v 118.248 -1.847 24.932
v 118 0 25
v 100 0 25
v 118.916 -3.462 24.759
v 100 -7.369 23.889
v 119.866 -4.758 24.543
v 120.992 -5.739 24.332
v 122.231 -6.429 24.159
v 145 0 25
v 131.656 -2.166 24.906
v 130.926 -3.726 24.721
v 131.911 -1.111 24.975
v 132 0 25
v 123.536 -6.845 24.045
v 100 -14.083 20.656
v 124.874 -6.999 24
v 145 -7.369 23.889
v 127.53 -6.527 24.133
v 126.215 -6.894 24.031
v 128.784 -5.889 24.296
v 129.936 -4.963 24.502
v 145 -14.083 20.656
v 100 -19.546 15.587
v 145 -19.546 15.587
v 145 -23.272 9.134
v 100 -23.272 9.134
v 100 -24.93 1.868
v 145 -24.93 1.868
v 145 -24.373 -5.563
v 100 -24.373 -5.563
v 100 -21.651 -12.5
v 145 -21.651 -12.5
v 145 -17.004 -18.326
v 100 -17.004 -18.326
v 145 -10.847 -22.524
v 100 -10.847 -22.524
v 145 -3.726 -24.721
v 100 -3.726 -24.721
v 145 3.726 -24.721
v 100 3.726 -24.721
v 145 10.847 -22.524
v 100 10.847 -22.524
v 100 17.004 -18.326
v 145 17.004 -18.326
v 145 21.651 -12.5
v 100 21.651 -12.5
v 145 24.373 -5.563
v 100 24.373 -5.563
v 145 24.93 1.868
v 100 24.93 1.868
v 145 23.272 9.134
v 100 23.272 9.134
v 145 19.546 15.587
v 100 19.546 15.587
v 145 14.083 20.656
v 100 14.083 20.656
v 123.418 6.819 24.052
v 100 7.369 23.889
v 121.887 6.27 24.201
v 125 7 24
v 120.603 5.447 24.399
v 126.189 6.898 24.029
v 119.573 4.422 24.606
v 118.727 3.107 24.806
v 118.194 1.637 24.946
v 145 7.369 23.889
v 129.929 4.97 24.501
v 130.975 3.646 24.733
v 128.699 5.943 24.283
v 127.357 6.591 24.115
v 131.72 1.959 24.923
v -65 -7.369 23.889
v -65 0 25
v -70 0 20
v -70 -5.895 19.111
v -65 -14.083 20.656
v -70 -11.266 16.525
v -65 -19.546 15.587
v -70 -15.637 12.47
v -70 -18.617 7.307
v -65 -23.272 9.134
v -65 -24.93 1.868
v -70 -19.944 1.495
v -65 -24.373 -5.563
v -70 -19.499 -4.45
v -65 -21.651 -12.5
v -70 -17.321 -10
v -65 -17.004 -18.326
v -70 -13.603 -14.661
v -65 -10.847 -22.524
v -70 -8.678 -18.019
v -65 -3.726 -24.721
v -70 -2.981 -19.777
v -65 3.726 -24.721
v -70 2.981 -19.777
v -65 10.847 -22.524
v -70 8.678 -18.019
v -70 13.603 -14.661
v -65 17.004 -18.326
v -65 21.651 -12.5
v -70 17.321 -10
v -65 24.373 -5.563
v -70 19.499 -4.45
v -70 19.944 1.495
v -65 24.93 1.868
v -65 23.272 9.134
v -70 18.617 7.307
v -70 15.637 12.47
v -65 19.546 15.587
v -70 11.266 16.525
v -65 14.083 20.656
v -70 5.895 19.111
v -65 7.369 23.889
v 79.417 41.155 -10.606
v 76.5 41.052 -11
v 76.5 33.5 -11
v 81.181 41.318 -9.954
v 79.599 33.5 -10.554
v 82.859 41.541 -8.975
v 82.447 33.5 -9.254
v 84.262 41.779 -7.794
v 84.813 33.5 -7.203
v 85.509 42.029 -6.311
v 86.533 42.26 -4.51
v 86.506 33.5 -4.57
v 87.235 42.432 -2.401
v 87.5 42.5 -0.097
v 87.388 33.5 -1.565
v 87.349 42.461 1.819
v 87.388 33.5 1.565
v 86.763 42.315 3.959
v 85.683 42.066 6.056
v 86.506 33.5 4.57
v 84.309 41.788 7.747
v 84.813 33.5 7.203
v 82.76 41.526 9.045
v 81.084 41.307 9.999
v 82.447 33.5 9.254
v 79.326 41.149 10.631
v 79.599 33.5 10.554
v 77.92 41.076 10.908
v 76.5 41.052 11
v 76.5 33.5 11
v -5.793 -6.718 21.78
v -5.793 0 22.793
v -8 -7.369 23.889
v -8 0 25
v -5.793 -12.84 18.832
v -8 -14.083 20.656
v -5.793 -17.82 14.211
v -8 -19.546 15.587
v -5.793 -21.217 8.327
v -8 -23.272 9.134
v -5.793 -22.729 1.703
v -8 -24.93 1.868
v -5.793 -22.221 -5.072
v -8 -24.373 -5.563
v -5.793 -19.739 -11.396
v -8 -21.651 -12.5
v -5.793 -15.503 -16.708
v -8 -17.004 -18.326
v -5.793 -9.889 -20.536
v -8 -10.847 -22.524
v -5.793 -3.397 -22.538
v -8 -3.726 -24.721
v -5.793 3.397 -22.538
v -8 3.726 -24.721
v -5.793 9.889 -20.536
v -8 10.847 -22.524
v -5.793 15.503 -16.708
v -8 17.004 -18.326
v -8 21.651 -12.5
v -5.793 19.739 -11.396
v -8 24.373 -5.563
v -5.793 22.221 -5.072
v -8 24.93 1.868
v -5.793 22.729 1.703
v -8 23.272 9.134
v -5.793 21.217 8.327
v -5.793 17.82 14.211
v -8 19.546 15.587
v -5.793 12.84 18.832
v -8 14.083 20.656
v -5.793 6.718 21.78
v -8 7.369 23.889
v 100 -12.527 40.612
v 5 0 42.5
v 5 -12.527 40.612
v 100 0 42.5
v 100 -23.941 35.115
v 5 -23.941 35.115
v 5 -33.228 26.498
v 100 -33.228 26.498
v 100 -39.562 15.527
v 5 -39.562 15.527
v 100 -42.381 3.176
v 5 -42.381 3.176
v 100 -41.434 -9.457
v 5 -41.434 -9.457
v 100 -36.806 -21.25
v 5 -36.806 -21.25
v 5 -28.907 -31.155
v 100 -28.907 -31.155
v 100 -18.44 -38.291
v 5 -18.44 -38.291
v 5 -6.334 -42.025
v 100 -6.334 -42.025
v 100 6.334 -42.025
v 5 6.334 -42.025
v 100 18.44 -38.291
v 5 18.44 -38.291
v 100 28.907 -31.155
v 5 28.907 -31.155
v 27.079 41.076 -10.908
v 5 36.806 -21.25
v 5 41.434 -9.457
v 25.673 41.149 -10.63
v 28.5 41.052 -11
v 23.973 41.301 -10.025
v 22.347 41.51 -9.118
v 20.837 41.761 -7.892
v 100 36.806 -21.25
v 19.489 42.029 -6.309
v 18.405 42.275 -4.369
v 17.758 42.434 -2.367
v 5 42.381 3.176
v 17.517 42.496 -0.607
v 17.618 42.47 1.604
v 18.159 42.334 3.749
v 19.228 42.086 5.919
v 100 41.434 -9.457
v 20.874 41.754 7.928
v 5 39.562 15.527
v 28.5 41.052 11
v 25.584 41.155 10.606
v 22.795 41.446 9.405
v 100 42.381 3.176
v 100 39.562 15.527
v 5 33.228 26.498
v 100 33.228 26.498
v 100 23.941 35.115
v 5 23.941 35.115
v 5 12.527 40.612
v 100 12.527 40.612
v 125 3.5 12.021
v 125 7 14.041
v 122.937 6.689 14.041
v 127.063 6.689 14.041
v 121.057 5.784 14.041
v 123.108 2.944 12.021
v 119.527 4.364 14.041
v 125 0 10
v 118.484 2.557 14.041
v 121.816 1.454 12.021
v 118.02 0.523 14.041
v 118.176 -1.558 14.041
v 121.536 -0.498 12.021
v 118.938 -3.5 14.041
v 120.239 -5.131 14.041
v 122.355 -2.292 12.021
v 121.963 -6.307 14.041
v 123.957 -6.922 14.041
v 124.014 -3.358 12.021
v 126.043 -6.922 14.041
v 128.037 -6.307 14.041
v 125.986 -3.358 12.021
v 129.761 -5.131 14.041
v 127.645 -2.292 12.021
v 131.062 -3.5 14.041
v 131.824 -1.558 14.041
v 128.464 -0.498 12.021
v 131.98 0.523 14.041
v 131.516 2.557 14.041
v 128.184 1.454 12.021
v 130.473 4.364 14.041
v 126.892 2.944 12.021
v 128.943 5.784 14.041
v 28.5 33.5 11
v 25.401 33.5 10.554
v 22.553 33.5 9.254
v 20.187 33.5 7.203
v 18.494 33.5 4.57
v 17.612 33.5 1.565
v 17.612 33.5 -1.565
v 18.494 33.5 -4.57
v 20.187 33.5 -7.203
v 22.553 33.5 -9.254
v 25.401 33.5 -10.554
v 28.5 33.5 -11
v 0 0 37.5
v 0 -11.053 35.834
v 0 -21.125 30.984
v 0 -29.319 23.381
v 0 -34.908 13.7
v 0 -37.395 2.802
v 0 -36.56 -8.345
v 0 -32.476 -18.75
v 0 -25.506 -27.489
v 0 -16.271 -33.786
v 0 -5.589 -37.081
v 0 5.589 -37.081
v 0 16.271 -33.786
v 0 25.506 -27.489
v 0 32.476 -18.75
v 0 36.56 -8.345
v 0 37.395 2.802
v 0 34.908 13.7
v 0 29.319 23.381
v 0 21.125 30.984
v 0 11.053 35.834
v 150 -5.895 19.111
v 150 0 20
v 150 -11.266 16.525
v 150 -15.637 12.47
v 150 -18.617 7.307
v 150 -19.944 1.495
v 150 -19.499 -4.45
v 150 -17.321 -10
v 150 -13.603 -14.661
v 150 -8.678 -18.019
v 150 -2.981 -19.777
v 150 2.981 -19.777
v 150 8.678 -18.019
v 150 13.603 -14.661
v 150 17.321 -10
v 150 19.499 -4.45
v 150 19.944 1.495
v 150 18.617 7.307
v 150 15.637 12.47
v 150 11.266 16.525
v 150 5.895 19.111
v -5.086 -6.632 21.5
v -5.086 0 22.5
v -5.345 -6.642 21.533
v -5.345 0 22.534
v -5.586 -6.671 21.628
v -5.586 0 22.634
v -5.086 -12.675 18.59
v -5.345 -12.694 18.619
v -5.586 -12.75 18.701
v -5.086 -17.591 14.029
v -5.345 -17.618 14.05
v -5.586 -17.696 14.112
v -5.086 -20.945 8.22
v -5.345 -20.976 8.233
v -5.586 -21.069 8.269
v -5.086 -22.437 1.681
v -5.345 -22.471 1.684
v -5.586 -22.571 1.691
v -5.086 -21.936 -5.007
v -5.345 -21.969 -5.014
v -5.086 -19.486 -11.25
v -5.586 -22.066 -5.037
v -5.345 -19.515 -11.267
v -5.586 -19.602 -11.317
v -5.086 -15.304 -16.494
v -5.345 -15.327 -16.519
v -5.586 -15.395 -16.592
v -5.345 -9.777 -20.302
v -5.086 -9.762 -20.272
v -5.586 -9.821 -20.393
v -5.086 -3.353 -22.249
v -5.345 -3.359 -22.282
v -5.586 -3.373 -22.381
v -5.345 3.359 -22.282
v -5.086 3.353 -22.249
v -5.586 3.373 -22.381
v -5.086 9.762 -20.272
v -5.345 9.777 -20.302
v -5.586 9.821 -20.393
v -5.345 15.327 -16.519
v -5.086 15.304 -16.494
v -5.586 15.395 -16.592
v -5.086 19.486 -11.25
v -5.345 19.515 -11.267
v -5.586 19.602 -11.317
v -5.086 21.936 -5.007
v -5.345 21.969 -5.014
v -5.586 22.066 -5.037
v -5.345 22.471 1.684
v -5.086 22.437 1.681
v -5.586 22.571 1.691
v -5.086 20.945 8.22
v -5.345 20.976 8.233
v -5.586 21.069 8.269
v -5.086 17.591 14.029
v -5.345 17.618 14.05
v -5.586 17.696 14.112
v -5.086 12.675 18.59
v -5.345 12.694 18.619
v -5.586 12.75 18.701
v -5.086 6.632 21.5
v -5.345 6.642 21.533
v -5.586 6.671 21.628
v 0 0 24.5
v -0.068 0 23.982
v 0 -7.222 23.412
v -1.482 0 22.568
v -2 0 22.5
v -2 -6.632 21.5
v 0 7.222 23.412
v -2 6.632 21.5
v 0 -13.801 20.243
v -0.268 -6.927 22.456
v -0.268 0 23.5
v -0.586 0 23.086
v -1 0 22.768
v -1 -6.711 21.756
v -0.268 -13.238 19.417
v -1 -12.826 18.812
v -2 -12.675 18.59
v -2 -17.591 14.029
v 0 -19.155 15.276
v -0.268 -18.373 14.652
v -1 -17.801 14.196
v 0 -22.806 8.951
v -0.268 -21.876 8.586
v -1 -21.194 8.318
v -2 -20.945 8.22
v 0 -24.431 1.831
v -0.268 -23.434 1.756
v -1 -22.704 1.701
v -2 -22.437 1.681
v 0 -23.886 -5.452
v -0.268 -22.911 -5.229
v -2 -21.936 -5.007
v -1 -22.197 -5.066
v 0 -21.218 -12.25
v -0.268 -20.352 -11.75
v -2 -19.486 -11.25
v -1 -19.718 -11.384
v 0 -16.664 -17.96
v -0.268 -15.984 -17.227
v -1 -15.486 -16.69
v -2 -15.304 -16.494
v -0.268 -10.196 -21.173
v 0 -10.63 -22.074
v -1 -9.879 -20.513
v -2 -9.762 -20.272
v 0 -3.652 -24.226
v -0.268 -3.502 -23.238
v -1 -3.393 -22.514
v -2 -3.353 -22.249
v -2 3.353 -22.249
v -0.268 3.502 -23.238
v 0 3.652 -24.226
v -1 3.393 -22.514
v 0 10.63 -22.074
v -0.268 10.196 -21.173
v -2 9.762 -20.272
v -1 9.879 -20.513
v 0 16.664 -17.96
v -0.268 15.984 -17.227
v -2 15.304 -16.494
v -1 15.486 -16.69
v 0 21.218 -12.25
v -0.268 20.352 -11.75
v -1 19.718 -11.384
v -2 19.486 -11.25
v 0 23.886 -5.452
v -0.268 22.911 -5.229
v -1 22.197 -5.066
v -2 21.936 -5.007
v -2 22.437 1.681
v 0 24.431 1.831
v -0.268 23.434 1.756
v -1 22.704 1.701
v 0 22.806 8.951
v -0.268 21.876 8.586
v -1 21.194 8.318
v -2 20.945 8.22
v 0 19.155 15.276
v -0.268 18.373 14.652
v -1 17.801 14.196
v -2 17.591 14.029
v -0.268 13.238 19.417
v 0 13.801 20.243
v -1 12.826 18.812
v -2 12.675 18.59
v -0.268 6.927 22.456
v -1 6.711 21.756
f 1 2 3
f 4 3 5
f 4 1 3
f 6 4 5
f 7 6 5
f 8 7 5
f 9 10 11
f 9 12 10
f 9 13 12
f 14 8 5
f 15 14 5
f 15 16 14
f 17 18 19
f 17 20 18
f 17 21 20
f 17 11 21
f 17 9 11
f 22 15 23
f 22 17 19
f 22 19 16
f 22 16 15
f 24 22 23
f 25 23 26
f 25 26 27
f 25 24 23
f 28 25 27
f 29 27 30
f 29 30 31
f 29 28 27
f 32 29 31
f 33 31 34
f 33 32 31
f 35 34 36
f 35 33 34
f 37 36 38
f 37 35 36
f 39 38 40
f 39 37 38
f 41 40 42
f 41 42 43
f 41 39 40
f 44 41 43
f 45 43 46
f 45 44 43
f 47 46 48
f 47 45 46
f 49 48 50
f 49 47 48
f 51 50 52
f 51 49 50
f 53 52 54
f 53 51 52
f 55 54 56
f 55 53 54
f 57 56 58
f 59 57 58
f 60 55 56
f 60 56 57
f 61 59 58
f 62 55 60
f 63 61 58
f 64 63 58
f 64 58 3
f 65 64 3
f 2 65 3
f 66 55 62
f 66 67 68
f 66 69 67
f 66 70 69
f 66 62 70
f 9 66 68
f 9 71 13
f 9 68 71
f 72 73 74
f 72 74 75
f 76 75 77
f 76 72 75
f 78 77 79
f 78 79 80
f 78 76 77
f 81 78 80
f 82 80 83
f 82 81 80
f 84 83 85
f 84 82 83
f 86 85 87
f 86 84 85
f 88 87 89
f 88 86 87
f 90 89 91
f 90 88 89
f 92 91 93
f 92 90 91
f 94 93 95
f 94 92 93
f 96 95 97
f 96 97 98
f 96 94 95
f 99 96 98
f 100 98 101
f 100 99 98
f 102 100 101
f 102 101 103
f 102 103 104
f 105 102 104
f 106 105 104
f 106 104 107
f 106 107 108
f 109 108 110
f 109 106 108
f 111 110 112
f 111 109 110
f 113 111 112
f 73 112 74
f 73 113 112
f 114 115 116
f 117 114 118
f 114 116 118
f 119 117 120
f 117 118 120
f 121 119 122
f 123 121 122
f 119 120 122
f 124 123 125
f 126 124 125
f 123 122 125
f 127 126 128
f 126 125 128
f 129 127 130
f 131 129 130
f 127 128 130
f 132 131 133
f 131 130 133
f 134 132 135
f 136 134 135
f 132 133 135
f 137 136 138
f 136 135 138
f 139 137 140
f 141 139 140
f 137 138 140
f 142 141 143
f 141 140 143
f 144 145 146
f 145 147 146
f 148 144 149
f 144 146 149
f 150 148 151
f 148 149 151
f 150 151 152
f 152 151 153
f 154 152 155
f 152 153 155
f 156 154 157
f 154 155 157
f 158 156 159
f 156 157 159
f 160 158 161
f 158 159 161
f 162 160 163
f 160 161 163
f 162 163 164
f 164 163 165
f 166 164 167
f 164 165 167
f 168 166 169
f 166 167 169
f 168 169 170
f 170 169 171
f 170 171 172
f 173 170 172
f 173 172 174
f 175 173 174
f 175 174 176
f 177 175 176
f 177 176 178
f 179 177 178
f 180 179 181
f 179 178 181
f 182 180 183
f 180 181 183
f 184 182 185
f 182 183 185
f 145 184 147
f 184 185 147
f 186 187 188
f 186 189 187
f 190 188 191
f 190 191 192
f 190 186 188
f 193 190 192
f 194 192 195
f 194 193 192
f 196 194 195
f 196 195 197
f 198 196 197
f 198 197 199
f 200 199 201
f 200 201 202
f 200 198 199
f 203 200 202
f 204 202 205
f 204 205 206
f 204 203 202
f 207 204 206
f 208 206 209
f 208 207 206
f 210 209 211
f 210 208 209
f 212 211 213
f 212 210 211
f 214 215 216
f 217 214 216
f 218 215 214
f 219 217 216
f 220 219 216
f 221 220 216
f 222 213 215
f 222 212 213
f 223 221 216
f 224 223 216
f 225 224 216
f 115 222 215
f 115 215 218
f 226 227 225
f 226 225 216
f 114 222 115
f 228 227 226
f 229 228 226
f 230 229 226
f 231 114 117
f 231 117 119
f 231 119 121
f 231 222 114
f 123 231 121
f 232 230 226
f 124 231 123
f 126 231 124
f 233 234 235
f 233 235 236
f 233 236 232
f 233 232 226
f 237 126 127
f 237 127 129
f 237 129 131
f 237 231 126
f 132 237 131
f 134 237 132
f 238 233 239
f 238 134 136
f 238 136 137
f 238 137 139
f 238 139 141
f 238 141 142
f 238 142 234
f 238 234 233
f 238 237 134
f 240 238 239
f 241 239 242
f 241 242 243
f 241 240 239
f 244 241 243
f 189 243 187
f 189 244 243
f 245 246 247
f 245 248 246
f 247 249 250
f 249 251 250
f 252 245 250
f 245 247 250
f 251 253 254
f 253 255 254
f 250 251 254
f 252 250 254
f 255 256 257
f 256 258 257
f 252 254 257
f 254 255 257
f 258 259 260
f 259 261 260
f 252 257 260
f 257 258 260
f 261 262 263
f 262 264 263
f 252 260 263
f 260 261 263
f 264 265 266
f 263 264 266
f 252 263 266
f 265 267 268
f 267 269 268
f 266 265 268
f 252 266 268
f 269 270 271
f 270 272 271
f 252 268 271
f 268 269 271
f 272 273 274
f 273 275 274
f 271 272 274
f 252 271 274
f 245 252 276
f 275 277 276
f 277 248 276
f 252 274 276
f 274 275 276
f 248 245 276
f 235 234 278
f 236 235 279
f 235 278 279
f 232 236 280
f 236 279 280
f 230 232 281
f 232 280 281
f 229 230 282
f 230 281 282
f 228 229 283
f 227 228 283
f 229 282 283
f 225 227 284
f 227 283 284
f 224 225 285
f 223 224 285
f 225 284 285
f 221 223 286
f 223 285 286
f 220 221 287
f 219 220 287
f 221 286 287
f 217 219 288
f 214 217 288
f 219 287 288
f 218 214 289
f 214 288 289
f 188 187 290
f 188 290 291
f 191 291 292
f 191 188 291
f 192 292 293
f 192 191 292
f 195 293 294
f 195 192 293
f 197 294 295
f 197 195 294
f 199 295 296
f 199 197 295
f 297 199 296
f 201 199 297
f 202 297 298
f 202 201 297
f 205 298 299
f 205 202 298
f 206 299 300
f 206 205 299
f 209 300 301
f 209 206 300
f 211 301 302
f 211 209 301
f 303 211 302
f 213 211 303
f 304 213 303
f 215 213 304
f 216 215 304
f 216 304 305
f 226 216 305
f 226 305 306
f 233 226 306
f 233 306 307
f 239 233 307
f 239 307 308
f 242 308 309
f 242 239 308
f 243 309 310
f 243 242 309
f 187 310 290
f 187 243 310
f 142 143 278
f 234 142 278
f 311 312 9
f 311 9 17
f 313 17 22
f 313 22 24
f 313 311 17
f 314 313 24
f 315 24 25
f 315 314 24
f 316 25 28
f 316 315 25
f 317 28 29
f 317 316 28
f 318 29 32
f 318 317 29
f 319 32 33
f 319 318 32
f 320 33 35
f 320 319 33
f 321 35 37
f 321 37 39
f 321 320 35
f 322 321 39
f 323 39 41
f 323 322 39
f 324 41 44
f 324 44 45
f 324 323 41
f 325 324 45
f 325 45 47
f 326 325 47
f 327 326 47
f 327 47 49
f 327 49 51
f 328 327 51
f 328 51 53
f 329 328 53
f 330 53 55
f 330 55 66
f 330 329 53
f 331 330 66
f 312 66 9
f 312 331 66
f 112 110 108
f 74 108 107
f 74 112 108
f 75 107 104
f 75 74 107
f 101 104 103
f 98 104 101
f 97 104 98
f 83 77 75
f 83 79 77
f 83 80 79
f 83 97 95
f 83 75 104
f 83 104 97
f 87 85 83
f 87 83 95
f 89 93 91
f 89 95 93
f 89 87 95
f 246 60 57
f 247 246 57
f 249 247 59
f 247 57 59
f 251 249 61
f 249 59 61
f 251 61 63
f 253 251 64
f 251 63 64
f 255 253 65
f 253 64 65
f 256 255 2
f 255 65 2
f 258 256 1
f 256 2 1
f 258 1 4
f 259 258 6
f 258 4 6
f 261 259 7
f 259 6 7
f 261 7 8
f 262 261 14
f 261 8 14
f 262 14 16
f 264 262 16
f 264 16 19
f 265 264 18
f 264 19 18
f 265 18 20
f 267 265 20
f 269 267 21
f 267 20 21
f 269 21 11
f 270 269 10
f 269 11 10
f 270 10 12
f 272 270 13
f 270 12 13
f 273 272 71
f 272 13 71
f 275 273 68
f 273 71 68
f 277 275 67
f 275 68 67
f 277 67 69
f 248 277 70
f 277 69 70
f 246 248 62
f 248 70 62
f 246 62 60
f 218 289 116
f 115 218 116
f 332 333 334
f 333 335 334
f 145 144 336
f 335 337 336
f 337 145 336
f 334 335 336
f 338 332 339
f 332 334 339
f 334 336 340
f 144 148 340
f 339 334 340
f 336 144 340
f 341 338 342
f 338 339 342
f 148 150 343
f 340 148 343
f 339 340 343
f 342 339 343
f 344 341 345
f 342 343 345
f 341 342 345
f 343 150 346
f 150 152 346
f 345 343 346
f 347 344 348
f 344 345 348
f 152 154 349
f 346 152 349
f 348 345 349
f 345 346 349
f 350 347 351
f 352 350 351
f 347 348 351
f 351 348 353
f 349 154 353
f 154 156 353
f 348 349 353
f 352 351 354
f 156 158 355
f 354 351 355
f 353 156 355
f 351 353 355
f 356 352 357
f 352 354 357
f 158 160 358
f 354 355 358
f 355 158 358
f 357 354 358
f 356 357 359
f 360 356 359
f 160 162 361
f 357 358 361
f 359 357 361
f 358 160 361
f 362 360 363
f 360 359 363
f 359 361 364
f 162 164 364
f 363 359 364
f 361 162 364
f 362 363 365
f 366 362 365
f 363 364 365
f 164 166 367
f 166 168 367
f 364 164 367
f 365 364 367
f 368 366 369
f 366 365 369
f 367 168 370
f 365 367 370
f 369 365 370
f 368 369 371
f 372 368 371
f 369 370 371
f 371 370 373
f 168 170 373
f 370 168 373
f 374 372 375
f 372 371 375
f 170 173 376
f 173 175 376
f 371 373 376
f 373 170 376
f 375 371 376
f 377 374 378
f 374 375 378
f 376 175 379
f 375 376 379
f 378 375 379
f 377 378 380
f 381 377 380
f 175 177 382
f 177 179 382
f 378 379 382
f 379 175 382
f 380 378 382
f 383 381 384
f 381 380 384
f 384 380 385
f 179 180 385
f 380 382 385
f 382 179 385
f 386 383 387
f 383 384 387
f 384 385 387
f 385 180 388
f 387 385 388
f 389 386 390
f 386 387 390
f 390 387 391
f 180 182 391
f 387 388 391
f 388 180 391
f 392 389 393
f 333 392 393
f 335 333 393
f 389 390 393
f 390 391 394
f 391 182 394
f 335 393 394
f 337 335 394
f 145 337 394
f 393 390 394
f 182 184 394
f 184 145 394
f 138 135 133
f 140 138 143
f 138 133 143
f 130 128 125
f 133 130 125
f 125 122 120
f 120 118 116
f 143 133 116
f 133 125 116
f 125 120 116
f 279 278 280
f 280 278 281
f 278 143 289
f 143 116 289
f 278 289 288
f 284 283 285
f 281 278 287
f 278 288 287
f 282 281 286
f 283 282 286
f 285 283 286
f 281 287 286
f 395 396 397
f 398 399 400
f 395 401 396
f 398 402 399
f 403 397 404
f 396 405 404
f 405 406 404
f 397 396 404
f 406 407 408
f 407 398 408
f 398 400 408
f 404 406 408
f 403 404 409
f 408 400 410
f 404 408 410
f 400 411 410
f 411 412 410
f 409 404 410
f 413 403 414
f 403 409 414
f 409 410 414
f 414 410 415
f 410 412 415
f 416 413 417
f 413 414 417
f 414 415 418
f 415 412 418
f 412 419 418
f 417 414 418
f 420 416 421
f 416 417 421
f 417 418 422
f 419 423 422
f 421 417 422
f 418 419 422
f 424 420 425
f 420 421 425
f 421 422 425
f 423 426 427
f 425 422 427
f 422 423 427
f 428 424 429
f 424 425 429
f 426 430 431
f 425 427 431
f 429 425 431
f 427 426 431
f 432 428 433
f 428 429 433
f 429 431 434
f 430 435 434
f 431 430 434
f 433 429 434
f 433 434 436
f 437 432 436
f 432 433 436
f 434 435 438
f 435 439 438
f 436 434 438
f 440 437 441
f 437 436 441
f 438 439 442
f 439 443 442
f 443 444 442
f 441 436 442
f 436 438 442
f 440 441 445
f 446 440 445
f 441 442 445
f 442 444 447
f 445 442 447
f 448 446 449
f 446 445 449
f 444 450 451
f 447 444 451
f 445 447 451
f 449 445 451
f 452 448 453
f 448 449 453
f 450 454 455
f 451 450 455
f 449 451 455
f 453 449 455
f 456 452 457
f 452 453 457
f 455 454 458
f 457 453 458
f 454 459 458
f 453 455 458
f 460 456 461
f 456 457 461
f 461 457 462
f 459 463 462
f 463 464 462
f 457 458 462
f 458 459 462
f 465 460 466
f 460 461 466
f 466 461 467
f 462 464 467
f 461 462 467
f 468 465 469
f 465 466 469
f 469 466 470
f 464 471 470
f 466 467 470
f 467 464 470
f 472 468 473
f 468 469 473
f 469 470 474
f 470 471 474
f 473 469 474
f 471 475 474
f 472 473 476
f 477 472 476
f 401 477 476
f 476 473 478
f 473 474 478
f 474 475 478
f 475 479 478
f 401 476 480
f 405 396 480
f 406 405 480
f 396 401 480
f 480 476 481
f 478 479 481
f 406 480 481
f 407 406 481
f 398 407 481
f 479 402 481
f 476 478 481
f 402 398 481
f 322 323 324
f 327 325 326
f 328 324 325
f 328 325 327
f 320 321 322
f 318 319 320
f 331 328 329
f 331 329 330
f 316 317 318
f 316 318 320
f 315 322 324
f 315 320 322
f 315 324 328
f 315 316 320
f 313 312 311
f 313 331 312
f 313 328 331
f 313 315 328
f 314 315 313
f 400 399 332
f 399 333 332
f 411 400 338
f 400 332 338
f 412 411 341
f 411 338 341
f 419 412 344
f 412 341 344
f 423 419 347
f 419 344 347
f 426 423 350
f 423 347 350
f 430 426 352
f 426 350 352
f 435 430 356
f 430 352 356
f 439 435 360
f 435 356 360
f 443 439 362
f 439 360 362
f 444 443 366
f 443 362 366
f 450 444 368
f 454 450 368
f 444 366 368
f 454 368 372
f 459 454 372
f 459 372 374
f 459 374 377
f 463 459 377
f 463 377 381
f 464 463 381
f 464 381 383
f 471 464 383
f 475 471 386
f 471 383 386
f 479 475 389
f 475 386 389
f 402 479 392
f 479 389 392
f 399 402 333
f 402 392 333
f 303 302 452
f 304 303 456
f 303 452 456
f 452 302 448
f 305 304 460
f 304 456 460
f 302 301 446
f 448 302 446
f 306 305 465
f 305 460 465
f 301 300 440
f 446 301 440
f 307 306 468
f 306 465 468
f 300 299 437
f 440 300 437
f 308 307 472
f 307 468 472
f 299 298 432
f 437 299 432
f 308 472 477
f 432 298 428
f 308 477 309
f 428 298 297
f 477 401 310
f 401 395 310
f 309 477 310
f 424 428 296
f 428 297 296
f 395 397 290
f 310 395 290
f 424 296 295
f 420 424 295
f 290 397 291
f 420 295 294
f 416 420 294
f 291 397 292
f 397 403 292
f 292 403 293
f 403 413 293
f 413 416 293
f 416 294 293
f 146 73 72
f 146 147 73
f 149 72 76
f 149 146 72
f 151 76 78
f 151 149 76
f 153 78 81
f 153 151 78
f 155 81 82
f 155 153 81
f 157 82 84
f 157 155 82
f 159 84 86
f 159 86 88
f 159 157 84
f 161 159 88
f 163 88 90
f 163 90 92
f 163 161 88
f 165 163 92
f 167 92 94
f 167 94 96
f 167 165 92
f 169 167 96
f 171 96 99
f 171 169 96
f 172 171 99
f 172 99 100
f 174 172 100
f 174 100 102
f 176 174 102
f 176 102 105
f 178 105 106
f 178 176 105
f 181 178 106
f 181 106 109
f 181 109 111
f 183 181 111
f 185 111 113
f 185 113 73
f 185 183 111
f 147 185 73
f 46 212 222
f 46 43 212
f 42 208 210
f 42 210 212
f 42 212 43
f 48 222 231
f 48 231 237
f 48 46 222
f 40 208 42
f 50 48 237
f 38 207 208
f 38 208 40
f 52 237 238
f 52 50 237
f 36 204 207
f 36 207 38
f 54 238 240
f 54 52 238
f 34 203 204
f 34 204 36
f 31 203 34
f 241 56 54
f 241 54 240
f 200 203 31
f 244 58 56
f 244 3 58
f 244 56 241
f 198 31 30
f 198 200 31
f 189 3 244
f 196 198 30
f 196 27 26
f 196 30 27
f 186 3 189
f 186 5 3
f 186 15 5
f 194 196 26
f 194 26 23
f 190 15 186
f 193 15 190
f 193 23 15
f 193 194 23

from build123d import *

# Parameters (mm, degrees)
CHAMFER_1_SIZE      = 5
CUT_EXTRUDE_START   = 33.5
CUT_EXTRUDE_1_DEPTH = 129.093626112


with BuildPart() as part:
    # Эскиз1 → Повернуть1 (revolve)
    with BuildSketch(Plane.XY, mode=Mode.PRIVATE) as revolve_1_sk:
        Polygon((-70, 0), (-70, 25), (0, 25), (0, 42.5), (100, 42.5), (100, 25), (150, 25), (150, 0), align=None)
    revolve(revolve_1_sk.sketch.rotate(Axis((0, 0, 0), (1, 0, 0)), 90), axis=Axis((0, 0, 0), (1, 0, 0)))

    # Фаска1
    chamfer_1_edges = [part.edges().sort_by_distance(p)[0] for p in [
        (150, 0, -25),
        (0, 0, -42.5),
        (-70, 0, -25),
    ]]
    chamfer(chamfer_1_edges, length=CHAMFER_1_SIZE)

    # Эскиз2 → Вырез-Повернуть1 (revolve, cut)
    with BuildSketch(Plane.XY, mode=Mode.PRIVATE) as cut_revolve_1_sk:
        with BuildLine():
            Line((0, 25), (0, 24.5))
            ThreePointArc((0, 24.5), (-0.585786438, 23.085786438), (-2, 22.5))
            Line((-2, 22.5), (-5.085786438, 22.5))
            ThreePointArc((-5.085786438, 22.5), (-5.46846987, 22.576120467), (-5.792893219, 22.792893219))
            Line((-5.792893219, 22.792893219), (-8, 25))
            Line((-8, 25), (0, 25))
        make_face()
    revolve(cut_revolve_1_sk.sketch.rotate(Axis((0, 0, 0), (1, 0, 0)), 90), axis=Axis((0, 0, 0), (1, 0, 0)), mode=Mode.SUBTRACT)

    # Эскиз3 → Вырез-Вытянуть1 (cut, through all)
    with BuildSketch(Plane(origin=(0, 0, 0), x_dir=(1, 0, 0), z_dir=(0, 1, 0)).offset(CUT_EXTRUDE_START)):
        with BuildLine():
            Line((28.5, 11), (76.5, 11))
            ThreePointArc((76.5, 11), (87.5, 0), (76.5, -11))
            Line((76.5, -11), (28.5, -11))
            ThreePointArc((28.5, -11), (17.5, 0), (28.5, 11))
        make_face()
    extrude(amount=CUT_EXTRUDE_1_DEPTH, mode=Mode.SUBTRACT)

    # Эскиз4 → Вырез-Повернуть3 (revolve, cut)
    with BuildSketch(Plane(origin=(125, 0, 0), x_dir=(0, 0, -1), z_dir=(1, 0, 0))):
        Polygon((-10, 0), (-14.041451884, 7), (-25, 7), (-25, 0), align=None)
    revolve(axis=Axis((125, 0, 10), (0, 0, 1)), mode=Mode.SUBTRACT)


solid = part.part
